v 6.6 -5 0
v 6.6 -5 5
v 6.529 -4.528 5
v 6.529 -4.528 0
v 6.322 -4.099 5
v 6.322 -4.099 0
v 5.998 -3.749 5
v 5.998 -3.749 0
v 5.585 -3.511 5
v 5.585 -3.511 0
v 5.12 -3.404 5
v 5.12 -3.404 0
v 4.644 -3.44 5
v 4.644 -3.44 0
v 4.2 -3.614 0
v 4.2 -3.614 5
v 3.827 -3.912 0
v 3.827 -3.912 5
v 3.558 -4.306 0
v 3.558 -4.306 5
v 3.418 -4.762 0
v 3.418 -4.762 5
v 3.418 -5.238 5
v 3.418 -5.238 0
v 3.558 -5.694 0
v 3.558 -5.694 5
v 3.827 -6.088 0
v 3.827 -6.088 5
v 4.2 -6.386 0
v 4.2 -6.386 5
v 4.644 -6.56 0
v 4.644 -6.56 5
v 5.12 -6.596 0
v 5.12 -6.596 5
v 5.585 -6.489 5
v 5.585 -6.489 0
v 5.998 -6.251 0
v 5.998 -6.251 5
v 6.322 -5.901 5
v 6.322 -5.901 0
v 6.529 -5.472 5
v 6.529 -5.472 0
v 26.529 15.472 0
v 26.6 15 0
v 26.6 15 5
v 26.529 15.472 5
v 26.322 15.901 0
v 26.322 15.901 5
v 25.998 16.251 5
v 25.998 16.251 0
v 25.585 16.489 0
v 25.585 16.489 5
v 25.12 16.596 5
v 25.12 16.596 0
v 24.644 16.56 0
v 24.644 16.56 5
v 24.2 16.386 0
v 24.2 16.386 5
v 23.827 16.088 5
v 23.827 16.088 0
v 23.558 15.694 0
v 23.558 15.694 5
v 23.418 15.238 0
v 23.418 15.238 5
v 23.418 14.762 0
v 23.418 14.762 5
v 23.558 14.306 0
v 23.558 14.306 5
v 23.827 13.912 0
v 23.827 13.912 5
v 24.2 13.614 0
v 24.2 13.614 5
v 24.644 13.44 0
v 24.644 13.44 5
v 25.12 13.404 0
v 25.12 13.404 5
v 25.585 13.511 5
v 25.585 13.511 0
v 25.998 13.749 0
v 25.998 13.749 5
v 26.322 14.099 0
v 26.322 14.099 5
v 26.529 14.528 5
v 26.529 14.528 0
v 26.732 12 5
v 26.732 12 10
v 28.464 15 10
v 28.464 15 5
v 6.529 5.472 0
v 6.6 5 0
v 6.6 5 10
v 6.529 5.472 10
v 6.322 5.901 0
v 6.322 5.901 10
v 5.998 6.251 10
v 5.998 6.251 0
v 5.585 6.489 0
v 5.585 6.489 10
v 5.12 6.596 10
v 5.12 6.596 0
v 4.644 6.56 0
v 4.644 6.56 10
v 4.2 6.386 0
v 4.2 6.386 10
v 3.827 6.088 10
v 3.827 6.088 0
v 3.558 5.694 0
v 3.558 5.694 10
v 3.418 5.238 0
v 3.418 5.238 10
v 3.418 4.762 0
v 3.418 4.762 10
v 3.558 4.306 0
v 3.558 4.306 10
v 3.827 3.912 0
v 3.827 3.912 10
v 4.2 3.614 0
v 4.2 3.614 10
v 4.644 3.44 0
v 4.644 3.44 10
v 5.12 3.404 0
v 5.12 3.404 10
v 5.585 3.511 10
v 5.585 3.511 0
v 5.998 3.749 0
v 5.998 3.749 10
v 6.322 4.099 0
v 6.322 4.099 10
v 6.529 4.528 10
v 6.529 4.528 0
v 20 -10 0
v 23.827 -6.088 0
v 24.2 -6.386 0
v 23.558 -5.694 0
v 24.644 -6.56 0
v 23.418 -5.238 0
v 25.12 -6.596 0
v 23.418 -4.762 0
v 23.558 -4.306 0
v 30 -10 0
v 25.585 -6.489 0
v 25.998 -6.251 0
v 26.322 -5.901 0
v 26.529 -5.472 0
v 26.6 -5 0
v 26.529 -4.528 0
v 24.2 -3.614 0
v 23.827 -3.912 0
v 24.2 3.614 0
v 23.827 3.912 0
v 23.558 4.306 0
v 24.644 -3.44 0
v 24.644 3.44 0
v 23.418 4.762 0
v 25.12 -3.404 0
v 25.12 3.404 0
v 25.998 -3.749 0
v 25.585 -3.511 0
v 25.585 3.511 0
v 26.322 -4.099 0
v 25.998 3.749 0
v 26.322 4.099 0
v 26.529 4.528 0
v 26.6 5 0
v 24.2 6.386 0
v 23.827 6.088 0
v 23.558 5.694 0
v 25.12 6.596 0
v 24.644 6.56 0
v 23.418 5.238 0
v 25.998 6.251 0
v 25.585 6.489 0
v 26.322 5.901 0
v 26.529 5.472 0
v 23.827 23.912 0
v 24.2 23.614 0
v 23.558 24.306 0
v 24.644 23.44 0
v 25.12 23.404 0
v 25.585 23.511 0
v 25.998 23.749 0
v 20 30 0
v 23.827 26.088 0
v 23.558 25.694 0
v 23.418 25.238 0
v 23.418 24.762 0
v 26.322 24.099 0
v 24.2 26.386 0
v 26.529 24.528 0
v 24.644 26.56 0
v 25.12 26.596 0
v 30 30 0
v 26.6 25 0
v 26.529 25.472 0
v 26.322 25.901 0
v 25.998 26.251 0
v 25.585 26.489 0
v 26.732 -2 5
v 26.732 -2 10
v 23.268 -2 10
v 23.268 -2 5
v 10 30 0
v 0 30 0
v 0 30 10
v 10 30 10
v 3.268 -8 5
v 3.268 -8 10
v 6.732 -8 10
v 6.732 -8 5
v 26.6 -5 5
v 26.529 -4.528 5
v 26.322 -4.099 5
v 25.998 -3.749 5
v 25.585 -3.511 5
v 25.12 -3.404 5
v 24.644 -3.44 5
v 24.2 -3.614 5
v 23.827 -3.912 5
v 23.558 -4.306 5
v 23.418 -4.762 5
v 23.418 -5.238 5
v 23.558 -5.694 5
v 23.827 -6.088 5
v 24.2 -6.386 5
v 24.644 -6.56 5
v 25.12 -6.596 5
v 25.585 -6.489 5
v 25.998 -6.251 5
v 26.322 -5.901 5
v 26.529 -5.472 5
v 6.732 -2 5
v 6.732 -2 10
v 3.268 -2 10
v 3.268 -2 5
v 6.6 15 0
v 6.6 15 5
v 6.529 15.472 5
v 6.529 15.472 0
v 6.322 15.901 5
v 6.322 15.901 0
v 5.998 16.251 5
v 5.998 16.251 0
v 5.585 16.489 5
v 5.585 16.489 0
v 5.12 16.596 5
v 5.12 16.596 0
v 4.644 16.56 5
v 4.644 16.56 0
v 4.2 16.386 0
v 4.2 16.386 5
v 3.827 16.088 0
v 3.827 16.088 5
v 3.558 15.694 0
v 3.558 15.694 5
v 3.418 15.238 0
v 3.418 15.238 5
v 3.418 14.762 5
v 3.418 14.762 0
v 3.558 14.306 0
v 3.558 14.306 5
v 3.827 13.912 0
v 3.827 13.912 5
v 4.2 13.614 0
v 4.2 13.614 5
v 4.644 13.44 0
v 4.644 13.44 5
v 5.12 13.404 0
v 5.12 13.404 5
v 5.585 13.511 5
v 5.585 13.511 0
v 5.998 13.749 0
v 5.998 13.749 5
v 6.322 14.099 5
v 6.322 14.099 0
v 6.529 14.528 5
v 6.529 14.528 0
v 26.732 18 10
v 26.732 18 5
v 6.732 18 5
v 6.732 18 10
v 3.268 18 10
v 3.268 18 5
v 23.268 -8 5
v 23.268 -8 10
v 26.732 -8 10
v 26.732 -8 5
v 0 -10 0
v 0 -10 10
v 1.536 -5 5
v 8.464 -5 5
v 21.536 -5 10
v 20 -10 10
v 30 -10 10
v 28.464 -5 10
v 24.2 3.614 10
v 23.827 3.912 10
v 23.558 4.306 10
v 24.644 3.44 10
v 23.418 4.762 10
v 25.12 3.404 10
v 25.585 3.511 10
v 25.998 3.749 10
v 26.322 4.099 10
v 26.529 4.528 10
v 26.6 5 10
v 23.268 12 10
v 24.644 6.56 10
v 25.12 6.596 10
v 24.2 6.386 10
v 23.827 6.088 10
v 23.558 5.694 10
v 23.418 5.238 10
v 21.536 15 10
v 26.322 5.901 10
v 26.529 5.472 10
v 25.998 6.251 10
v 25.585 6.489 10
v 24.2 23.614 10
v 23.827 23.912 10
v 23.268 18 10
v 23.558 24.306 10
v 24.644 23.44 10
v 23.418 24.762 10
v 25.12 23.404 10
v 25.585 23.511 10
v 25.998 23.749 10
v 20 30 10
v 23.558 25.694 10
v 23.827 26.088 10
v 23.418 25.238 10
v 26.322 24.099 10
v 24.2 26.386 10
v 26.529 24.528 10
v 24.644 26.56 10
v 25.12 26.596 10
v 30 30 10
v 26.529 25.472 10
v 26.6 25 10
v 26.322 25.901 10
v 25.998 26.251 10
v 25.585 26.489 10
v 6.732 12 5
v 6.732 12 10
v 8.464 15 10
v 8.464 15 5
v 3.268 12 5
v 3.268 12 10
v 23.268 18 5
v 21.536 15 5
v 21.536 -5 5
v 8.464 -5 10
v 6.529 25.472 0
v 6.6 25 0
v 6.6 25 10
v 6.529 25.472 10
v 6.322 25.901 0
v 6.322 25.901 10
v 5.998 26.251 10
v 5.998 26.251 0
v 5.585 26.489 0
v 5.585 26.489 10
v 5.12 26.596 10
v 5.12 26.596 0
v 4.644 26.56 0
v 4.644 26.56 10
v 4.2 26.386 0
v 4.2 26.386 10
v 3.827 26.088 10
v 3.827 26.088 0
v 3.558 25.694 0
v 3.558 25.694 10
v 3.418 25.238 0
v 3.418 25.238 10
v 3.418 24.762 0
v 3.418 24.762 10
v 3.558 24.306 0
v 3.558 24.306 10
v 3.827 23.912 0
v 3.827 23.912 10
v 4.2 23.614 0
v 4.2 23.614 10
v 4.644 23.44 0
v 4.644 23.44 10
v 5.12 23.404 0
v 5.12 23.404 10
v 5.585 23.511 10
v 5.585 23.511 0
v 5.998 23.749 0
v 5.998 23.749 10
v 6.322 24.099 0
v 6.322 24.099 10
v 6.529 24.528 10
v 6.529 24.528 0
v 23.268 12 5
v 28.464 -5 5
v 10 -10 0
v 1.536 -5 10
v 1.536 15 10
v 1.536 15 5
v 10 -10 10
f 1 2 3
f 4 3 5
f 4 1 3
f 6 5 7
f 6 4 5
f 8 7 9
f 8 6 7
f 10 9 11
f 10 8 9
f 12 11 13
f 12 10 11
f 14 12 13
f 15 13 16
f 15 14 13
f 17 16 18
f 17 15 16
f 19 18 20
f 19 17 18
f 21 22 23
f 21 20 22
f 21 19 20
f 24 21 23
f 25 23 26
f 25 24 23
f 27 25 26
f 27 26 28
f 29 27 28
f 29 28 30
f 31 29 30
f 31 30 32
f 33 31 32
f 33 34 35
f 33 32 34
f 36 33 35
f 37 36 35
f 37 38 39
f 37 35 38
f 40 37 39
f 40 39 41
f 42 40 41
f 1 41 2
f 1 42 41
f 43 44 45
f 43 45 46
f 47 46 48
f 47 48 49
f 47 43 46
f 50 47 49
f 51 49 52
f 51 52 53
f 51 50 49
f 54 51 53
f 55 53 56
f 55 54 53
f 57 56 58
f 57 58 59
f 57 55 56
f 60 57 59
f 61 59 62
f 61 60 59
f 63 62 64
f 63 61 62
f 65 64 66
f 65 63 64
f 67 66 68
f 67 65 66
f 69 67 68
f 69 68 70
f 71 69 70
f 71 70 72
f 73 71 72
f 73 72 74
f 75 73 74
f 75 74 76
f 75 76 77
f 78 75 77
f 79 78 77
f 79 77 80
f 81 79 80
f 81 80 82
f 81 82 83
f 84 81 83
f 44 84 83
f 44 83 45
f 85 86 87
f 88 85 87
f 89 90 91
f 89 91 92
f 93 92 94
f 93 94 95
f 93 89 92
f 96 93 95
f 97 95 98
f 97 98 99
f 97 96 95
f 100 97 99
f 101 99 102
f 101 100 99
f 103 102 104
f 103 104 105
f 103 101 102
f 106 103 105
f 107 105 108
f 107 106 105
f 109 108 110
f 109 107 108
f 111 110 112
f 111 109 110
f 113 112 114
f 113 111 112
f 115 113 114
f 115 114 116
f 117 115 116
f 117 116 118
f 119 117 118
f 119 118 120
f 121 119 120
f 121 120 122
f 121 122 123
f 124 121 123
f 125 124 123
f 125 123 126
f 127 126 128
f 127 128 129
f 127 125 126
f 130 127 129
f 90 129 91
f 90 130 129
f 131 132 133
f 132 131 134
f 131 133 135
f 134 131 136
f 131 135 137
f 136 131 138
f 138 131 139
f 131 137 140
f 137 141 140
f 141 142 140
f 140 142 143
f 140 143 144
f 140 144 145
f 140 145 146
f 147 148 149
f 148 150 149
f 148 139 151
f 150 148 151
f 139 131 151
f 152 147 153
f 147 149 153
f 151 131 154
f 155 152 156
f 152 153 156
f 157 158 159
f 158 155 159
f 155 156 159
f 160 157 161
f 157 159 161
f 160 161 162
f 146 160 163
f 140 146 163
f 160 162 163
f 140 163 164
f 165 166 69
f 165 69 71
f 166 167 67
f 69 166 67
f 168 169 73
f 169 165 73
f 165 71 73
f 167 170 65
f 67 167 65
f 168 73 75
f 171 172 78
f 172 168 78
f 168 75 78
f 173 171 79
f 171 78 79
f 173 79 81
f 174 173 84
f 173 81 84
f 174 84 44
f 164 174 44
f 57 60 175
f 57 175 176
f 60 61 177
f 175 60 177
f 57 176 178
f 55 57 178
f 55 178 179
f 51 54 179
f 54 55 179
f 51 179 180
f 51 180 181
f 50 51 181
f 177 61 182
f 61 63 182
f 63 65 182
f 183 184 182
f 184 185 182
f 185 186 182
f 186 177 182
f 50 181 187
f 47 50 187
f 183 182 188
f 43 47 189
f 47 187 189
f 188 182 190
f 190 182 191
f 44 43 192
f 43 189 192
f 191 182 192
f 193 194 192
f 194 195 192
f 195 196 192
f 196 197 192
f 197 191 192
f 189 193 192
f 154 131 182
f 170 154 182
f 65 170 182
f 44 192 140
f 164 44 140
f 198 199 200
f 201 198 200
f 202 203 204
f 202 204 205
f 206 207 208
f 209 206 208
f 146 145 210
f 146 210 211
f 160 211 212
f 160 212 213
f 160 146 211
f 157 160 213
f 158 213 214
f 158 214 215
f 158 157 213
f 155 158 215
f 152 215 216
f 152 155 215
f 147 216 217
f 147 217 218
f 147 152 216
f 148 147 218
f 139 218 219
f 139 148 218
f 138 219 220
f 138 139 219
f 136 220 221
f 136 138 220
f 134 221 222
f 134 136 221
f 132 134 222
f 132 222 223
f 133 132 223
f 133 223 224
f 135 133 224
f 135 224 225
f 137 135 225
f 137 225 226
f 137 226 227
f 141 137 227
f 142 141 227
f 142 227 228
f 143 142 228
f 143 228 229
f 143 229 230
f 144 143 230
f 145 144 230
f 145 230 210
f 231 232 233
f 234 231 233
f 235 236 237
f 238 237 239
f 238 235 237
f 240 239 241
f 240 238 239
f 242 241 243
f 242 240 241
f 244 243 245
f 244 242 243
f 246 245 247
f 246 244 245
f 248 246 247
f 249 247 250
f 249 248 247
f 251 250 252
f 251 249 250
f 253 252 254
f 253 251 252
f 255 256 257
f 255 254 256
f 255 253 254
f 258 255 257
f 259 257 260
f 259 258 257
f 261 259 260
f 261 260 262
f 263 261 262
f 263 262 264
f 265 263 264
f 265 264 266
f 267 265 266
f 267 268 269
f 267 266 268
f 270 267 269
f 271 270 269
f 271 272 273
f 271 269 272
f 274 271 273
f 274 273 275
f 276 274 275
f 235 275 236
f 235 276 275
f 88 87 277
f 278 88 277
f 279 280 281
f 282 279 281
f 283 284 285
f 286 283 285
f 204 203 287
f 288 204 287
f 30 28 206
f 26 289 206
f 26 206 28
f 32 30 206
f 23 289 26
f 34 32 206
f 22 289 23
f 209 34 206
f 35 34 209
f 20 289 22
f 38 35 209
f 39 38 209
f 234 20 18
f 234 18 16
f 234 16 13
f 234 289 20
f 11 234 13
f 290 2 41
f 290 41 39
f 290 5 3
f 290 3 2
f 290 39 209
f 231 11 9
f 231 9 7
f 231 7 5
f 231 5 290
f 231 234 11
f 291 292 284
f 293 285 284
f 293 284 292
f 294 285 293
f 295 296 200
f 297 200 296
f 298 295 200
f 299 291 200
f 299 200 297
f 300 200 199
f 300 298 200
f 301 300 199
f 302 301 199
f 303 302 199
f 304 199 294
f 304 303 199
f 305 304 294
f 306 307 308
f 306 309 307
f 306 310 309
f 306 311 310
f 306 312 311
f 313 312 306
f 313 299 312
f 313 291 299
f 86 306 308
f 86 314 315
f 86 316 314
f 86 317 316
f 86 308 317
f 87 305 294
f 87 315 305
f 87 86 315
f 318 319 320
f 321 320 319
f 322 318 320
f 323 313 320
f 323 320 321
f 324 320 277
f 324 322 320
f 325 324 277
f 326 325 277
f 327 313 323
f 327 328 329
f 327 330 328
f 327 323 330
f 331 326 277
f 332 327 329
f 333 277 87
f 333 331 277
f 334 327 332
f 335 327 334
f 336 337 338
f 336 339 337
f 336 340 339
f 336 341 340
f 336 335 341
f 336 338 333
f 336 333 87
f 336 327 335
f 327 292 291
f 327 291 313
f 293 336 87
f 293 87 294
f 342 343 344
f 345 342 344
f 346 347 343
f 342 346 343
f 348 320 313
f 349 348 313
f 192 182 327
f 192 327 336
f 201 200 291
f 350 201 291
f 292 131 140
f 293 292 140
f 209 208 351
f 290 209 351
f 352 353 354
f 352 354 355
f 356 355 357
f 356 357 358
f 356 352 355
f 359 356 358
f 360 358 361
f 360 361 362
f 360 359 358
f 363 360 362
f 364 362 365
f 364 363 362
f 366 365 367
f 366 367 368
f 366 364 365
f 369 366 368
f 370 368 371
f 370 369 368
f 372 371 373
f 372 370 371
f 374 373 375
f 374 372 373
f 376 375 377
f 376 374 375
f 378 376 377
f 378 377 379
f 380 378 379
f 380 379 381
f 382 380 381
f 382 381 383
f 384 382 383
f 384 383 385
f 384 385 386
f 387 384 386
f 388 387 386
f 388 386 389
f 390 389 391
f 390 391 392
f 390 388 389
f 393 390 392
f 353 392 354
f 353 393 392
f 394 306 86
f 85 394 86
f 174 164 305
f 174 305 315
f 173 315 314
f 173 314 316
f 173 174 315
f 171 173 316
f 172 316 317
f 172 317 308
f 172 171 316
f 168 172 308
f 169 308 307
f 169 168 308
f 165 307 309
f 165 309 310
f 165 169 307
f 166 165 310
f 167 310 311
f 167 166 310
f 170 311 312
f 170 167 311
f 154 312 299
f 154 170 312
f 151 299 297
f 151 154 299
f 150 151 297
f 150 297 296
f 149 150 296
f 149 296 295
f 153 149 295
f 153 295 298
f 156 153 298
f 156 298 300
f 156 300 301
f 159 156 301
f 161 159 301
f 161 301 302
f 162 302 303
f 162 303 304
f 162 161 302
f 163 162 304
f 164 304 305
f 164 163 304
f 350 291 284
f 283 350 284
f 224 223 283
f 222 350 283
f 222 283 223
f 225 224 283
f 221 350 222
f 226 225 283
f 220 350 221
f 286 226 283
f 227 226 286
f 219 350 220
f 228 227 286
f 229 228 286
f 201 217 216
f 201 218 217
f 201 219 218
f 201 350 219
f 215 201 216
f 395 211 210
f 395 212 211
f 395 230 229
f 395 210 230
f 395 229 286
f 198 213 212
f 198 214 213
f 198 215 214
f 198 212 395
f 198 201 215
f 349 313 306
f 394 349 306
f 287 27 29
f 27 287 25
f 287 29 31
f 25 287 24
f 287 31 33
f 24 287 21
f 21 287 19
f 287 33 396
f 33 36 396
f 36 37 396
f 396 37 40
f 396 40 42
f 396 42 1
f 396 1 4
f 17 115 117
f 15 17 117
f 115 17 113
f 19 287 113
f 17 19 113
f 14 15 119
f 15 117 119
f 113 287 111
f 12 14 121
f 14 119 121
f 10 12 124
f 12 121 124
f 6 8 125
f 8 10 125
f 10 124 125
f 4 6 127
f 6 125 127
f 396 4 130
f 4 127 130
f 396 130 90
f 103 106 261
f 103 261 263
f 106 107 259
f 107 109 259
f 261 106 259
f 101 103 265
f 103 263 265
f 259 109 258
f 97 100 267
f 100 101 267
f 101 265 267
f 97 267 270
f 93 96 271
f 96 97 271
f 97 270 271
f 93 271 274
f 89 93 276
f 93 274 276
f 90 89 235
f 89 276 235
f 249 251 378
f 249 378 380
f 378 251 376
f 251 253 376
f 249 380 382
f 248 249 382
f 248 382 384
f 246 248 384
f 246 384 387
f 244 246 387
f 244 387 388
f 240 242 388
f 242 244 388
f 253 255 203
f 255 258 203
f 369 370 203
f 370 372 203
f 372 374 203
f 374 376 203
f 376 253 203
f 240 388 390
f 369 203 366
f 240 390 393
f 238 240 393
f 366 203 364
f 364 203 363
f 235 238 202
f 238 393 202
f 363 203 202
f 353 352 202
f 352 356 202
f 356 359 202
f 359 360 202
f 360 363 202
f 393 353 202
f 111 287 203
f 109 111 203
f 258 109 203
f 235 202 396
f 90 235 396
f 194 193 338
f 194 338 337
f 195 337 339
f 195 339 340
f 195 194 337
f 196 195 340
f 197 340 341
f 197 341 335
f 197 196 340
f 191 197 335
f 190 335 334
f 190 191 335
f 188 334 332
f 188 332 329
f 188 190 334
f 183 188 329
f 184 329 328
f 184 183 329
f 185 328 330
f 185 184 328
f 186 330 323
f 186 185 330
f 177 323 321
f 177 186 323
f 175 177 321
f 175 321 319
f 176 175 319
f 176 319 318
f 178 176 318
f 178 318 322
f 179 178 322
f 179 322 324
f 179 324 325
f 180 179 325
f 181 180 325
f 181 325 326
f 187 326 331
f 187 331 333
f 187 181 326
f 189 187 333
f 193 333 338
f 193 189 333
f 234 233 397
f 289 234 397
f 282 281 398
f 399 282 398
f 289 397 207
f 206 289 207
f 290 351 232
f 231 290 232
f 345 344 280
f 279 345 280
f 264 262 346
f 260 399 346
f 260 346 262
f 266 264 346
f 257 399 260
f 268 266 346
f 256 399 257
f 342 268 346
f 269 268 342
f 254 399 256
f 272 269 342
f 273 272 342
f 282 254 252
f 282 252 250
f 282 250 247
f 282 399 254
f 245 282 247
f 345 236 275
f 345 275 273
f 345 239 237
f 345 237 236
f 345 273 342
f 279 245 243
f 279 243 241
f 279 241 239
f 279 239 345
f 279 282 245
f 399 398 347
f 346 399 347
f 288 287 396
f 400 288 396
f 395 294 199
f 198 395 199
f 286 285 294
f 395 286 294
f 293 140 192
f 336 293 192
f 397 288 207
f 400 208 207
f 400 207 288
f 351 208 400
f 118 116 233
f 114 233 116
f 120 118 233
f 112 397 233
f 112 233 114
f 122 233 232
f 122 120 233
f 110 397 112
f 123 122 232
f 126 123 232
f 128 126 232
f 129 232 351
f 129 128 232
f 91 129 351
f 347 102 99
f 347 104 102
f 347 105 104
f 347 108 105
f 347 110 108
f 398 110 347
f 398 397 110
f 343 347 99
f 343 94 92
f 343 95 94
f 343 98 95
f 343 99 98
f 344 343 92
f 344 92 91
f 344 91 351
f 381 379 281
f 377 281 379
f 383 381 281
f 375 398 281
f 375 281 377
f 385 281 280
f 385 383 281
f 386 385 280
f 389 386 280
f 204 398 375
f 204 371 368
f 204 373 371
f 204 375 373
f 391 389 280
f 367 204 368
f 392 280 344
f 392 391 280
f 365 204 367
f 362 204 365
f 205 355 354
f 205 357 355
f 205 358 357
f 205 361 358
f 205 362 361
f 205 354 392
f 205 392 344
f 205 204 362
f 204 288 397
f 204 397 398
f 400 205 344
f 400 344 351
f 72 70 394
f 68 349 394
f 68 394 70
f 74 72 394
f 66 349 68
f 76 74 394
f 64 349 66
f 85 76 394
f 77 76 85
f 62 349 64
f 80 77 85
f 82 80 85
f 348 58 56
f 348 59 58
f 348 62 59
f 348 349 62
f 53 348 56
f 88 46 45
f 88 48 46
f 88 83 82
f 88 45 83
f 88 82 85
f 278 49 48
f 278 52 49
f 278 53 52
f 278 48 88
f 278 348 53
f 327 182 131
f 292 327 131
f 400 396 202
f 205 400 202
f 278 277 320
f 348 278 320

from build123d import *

# Parameters (mm, degrees)
SKETCH1_W           = 10
SKETCH1_H           = 30
SKETCH1_R           = 1.6
SKETCH1_H_2         = 10
BOSS_EXTRUDE1_DEPTH = 10
SKETCH4_R           = 1.6
CUT_EXTRUDE1_DEPTH  = 5


with BuildPart() as part:
    # Sketch1 → Boss-Extrude1 (new body)
    with BuildSketch(Plane.XY):
        with Locations((5, 15)):
            Rectangle(SKETCH1_W, SKETCH1_H)
        with Locations((5, 5)):
            Circle(SKETCH1_R, mode=Mode.SUBTRACT)
        with Locations((5, 15)):
            Circle(SKETCH1_R, mode=Mode.SUBTRACT)
        with Locations((5, 25)):
            Circle(SKETCH1_R, mode=Mode.SUBTRACT)
        with Locations((5, -5)):
            Rectangle(SKETCH1_W, SKETCH1_H_2)
        with Locations((5, -5)):
            Circle(SKETCH1_R, mode=Mode.SUBTRACT)
        with Locations((25, 15)):
            Rectangle(SKETCH1_W, SKETCH1_H)
        with Locations((25, 5)):
            Circle(SKETCH1_R, mode=Mode.SUBTRACT)
        with Locations((25, 15)):
            Circle(SKETCH1_R, mode=Mode.SUBTRACT)
        with Locations((25, 25)):
            Circle(SKETCH1_R, mode=Mode.SUBTRACT)
        with Locations((25, -5)):
            Rectangle(SKETCH1_W, SKETCH1_H_2)
        with Locations((25, -5)):
            Circle(SKETCH1_R, mode=Mode.SUBTRACT)
    extrude(amount=BOSS_EXTRUDE1_DEPTH)

    # Sketch4 → Cut-Extrude1 (cut)
    with BuildSketch(Plane.XY.offset(10)):
        Polygon((6.732050808, -8), (8.464101615, -5), (6.732050808, -2), (3.267949192, -2), (1.535898385, -5), (3.267949192, -8), align=None)
        Polygon((3.267949192, 12), (6.732050808, 12), (8.464101615, 15), (6.732050808, 18), (3.267949192, 18), (1.535898385, 15), align=None)
        Polygon((23.267949192, 12), (26.732050808, 12), (28.464101615, 15), (26.732050808, 18), (23.267949192, 18), (21.535898385, 15), align=None)
        with Locations((25, 15)):
            Circle(SKETCH4_R, mode=Mode.SUBTRACT)
        Polygon((23.267949192, -8), (26.732050808, -8), (28.464101615, -5), (26.732050808, -2), (23.267949192, -2), (21.535898385, -5), align=None)
        with Locations((25, -5)):
            Circle(SKETCH4_R, mode=Mode.SUBTRACT)
    extrude(amount=-CUT_EXTRUDE1_DEPTH, mode=Mode.SUBTRACT)


solid = part.part
